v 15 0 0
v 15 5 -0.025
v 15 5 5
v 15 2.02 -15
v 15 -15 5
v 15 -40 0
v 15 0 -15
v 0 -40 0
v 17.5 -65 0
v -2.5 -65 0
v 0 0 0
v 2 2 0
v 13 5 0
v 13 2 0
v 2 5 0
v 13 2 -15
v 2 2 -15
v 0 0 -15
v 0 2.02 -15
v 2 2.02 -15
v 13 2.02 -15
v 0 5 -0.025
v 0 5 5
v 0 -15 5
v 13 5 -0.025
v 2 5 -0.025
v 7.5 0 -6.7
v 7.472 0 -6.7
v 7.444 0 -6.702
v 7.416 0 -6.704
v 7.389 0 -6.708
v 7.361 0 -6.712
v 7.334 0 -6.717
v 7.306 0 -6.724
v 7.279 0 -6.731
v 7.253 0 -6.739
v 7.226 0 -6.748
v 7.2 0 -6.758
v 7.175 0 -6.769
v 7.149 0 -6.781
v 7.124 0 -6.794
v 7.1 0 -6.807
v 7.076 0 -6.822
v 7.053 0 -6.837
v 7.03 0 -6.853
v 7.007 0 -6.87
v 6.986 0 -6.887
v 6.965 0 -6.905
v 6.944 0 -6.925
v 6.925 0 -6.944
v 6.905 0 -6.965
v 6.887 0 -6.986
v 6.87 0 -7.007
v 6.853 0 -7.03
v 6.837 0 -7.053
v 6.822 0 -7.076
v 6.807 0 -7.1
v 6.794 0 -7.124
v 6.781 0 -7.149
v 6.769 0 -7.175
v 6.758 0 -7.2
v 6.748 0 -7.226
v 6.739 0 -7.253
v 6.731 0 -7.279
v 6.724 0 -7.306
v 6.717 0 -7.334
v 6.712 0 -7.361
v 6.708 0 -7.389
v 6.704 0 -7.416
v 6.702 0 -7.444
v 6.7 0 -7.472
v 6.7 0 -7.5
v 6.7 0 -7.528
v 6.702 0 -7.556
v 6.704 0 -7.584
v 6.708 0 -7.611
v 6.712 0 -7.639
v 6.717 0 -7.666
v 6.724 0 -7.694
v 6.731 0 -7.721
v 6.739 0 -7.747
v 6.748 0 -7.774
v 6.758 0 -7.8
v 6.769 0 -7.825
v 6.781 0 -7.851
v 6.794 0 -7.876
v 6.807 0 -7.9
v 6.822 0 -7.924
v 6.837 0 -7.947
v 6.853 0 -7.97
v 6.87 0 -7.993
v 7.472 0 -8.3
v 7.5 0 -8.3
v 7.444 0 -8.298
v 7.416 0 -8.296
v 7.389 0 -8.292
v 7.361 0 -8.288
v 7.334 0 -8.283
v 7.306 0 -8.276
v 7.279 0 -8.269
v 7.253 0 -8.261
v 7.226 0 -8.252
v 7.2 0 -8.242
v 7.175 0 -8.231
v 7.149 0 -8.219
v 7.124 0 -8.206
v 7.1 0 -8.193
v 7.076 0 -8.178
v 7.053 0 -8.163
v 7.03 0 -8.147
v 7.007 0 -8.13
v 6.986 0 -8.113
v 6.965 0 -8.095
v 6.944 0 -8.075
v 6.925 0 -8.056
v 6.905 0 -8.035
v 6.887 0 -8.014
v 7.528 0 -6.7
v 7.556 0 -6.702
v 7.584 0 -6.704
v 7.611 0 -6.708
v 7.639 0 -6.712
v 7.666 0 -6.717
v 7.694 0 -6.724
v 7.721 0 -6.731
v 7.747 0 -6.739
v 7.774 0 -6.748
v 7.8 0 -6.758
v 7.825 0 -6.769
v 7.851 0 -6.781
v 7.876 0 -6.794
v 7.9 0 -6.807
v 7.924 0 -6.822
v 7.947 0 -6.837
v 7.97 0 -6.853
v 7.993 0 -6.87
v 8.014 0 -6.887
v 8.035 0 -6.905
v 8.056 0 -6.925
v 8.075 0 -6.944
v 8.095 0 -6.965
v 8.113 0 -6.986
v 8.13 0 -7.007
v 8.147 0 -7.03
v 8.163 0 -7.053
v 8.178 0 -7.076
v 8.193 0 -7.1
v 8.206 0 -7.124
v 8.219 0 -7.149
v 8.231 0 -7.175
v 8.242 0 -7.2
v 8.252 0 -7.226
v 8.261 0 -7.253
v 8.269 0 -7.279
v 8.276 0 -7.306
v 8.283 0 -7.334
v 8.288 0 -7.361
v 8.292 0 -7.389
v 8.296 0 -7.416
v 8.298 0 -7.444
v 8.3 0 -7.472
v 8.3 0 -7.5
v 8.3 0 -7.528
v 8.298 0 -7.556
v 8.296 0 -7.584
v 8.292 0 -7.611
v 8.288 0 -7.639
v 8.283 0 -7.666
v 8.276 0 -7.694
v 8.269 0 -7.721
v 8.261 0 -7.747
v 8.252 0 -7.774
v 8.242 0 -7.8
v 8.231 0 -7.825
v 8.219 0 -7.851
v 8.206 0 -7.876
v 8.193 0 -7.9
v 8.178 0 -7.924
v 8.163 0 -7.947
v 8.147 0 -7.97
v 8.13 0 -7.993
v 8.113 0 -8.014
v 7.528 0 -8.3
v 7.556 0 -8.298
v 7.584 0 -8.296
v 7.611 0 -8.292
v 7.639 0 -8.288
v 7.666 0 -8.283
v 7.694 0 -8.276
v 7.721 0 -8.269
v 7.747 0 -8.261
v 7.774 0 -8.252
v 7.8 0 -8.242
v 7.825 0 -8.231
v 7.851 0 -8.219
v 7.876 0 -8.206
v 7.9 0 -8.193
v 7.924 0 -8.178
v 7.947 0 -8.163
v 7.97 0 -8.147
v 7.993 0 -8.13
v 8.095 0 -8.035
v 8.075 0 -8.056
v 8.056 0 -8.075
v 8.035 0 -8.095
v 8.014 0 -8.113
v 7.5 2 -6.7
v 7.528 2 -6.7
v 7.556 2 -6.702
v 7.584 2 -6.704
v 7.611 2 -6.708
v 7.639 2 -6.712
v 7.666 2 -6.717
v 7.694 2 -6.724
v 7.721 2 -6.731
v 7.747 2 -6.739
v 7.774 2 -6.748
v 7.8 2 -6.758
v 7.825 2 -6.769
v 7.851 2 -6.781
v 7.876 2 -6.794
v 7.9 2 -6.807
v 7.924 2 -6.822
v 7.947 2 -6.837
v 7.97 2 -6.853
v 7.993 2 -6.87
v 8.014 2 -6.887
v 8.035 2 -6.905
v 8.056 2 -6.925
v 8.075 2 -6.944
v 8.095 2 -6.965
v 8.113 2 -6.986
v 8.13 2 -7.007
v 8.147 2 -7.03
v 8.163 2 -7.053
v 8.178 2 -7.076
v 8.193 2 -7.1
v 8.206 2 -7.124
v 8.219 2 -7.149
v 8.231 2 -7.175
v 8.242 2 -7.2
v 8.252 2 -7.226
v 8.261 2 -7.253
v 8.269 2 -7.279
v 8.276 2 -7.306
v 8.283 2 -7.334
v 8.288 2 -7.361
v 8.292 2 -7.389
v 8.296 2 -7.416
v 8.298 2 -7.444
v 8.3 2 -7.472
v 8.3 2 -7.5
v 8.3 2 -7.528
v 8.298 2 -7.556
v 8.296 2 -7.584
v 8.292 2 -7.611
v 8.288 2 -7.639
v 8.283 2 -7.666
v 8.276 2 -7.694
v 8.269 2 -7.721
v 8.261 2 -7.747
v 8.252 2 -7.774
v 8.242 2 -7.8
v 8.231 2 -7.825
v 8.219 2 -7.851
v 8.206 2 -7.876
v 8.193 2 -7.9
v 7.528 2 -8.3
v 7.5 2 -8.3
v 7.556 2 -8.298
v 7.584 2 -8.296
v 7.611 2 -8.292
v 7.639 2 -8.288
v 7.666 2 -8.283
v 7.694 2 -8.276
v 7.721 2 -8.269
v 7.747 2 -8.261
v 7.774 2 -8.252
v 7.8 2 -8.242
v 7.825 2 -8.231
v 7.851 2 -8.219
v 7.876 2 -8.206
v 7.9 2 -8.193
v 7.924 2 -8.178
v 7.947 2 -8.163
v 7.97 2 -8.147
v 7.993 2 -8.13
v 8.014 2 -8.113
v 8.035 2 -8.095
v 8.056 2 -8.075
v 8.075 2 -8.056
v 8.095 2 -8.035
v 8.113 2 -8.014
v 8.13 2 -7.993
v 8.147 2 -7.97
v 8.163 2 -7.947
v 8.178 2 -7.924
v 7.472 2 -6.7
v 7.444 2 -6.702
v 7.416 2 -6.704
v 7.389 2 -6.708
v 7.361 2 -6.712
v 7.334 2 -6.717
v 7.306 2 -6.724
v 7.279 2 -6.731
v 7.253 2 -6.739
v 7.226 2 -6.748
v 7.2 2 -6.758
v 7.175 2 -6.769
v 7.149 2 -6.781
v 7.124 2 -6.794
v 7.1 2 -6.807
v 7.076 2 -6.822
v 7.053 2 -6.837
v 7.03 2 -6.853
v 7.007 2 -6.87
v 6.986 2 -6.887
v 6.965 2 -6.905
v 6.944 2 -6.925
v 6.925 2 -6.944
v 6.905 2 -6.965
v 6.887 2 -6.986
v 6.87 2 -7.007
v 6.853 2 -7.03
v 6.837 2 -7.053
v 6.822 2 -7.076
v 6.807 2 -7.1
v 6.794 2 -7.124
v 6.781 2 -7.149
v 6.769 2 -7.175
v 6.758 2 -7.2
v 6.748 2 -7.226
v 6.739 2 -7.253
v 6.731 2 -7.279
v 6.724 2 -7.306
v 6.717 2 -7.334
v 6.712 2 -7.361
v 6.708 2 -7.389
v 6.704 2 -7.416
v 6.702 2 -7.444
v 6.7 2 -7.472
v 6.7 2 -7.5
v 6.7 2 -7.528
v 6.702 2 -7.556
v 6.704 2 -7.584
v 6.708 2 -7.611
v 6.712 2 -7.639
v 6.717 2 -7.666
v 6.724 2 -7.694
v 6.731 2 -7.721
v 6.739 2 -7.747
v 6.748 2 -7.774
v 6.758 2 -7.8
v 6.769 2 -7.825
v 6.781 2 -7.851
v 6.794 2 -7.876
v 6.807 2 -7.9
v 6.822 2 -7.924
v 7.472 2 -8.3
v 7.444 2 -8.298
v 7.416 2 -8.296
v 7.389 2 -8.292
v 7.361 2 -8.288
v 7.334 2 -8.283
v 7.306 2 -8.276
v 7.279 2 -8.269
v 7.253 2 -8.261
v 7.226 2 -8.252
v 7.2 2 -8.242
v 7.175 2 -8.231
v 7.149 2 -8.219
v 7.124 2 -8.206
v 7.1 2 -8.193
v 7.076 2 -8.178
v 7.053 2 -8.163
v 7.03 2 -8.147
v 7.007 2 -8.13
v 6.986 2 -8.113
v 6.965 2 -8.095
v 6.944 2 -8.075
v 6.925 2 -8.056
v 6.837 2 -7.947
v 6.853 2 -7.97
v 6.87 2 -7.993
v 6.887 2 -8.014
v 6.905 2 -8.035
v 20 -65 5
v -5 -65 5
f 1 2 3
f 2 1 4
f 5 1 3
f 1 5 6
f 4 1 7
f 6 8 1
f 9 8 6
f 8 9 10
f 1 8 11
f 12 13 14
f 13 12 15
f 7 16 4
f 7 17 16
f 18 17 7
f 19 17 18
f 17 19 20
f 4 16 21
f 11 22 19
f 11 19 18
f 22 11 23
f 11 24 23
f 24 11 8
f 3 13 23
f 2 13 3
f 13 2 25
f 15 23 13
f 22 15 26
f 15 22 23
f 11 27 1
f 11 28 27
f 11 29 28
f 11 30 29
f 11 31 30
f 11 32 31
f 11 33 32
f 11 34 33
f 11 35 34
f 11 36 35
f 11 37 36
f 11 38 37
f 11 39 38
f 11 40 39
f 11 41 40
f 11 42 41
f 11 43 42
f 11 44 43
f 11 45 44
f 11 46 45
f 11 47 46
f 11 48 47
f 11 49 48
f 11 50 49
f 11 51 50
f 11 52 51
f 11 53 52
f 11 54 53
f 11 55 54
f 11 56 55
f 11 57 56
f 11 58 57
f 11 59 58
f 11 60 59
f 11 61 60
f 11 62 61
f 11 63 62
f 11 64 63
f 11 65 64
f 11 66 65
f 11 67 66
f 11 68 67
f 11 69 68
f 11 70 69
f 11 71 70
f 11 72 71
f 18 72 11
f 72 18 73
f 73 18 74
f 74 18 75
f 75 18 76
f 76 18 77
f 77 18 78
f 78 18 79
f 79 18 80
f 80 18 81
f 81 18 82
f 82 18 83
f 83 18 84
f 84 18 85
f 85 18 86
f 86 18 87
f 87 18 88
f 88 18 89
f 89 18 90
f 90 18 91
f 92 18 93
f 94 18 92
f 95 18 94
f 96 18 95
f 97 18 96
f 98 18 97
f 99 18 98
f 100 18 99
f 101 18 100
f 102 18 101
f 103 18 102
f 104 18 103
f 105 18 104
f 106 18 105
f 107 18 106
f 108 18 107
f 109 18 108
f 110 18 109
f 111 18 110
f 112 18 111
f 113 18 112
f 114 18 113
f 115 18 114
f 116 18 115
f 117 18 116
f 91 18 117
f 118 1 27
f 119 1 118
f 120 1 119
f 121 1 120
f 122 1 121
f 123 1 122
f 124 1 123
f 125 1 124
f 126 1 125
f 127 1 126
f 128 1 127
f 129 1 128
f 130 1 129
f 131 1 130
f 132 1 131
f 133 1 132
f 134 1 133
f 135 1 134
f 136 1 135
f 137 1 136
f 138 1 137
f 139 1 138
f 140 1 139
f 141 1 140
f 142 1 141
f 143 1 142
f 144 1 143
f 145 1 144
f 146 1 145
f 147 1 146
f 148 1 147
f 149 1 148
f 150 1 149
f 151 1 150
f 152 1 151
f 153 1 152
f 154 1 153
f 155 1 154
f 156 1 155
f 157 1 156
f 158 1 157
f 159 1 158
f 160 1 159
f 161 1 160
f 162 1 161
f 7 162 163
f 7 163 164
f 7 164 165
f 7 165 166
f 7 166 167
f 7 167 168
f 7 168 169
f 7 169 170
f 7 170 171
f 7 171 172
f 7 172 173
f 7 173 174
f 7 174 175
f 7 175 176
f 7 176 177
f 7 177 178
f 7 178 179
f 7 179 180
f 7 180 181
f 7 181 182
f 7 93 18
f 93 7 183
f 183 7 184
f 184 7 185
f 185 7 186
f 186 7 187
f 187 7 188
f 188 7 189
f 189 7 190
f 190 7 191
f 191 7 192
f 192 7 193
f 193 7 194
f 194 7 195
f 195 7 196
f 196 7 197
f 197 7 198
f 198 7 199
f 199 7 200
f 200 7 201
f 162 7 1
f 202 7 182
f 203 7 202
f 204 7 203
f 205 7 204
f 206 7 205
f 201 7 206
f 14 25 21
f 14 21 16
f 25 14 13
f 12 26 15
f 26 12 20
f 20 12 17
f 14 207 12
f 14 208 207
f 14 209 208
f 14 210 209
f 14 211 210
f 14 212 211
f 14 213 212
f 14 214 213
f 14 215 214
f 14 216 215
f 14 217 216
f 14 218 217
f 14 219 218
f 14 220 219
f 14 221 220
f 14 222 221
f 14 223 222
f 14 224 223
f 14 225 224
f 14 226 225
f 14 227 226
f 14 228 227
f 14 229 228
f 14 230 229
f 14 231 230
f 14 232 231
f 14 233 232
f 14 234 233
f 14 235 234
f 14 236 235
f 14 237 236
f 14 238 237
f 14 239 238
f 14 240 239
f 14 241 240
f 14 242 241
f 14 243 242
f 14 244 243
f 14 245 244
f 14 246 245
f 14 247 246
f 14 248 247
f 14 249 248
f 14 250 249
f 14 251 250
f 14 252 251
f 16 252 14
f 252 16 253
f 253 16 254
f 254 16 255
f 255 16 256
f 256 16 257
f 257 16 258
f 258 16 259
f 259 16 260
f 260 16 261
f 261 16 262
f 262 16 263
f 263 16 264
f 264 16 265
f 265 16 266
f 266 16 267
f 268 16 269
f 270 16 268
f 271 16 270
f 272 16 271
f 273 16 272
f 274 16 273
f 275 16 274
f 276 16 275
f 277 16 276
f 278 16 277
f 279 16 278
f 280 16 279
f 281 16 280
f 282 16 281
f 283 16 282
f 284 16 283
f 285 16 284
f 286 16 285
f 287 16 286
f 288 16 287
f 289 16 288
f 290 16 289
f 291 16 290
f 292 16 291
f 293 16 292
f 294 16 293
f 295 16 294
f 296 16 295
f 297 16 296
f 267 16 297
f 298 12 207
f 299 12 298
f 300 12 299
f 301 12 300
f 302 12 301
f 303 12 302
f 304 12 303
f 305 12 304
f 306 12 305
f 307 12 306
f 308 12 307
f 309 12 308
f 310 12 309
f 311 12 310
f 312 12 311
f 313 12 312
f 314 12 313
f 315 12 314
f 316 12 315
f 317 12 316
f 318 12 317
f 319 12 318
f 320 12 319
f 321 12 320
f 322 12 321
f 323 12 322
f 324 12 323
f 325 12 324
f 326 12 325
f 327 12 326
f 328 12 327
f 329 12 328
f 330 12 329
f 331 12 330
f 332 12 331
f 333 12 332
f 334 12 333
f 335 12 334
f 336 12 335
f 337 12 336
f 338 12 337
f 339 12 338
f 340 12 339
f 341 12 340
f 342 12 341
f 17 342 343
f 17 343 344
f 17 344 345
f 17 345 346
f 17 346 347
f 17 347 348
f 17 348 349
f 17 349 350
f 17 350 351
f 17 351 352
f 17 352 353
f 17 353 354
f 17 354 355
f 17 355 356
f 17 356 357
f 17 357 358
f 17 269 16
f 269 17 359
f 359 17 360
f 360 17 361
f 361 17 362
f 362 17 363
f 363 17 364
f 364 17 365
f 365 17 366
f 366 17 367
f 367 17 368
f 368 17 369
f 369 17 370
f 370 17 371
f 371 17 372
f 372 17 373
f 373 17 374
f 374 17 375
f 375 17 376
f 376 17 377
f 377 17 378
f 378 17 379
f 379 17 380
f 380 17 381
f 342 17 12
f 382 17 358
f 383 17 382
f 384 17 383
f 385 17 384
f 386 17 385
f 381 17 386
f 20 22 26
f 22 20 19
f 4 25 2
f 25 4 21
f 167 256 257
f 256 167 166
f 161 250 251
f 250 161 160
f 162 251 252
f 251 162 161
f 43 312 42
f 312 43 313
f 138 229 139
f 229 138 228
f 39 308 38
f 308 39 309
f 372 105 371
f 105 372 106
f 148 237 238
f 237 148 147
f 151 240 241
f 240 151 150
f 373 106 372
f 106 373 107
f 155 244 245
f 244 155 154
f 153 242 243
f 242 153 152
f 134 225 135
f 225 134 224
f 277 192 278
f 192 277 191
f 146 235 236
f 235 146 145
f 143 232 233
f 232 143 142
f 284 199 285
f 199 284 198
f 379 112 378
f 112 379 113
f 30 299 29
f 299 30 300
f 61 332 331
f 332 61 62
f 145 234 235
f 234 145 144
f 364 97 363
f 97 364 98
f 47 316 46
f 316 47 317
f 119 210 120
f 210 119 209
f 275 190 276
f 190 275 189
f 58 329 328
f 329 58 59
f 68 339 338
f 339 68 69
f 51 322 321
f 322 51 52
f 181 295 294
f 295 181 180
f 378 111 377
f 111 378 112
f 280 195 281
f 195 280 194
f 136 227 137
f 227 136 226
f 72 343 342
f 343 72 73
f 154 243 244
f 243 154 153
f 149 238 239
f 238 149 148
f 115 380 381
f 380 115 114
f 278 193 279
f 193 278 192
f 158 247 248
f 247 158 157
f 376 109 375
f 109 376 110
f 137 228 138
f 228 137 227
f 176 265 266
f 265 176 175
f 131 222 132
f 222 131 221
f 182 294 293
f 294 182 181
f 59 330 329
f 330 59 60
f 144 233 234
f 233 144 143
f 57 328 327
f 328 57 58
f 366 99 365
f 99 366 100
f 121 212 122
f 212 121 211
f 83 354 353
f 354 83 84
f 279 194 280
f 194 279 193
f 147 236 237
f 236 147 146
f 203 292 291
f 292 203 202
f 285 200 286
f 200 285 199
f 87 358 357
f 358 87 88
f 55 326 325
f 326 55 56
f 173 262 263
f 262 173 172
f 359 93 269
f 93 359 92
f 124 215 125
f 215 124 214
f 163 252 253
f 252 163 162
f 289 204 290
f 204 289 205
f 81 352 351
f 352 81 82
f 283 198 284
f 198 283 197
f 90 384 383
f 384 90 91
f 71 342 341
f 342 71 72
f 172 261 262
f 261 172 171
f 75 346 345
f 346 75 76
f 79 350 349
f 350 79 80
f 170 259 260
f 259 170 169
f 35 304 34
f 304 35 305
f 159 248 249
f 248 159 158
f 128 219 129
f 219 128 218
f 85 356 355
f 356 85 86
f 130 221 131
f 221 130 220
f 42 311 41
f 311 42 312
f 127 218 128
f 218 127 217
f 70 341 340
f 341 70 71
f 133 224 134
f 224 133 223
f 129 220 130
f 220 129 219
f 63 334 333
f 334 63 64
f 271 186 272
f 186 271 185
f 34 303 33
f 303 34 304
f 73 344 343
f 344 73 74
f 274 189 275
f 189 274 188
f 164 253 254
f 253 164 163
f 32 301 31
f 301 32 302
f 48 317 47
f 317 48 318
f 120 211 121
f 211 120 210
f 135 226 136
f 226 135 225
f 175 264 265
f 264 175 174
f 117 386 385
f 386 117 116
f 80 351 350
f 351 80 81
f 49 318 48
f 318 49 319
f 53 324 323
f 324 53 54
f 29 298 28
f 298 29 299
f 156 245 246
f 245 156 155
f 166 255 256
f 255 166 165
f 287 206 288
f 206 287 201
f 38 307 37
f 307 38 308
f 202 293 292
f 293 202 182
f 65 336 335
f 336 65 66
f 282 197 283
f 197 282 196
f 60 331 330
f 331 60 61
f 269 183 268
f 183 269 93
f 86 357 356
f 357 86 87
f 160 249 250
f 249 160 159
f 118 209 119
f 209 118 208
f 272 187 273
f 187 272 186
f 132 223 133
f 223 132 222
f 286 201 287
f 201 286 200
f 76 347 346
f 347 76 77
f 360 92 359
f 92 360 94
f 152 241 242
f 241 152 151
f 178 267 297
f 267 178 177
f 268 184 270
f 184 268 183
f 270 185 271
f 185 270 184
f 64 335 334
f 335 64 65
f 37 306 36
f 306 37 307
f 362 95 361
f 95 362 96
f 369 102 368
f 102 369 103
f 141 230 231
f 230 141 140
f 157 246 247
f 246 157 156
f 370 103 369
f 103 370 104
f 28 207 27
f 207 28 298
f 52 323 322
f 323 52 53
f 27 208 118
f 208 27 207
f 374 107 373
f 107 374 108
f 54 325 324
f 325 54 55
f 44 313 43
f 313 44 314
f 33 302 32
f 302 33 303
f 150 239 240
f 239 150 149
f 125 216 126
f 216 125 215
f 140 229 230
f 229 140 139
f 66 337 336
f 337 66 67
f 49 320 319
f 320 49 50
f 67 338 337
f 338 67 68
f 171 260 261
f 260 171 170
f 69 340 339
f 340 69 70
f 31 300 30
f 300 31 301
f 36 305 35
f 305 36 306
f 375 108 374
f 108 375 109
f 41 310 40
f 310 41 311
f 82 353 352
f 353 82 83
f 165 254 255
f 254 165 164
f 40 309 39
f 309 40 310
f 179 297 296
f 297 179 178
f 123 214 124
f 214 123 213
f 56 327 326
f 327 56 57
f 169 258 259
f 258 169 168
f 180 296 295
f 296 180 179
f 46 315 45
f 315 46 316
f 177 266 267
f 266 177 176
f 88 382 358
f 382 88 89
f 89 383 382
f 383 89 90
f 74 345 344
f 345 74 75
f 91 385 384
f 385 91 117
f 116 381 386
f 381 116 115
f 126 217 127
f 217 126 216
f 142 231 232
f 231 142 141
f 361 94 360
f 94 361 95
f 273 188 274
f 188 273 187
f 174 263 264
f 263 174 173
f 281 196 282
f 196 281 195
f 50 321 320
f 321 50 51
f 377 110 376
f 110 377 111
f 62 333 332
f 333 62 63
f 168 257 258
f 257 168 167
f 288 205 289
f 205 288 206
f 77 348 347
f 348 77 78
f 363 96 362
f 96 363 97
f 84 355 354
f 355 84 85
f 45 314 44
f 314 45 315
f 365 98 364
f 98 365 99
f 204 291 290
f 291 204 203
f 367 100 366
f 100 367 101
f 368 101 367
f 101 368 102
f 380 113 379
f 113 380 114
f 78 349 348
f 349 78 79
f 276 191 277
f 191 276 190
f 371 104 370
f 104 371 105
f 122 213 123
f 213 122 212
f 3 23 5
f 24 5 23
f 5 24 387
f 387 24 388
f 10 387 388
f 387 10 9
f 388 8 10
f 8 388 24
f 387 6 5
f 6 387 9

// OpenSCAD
// file: parts/slide.scad
module slide(l, h, w1, w2){
    translate([-w1/2, -l/2, -h/2])
    polyhedron(
        points=[
            // lowest layer
            [0, 0, 0],
            [w1, 0, 0],
            [w2-((w2-w1)/2), l, 0],
            [-((w2-w1)/2), l, 0],

            // top layer
            [h/2, 0, h],
            [w1-h/2, 0, h],
            [w2-((w2-w1)/2)-h/2, l, h],
            [-((w2-w1)/2)+h/2, l, h],
            [0, h/2, h],
            [0, w1-h/2, h],
            [l, w2-((w2-w1)/2), h],
            [l, -((w2-w1)/2)+h/2, h]
        ],
        faces=[
            // bottom
            [0, 1, 2, 3],

            // sides beginning with front
            [0, 4, 5, 1],
            [1, 5, 6, 2],
            [3, 2, 6, 7],
            [0, 3, 7, 4],

            // top
            [4, 7, 6, 5]
        ]
    );
}

slide(60, 5, 20, 24);
// file: parts/screw_hole.scad
module screw_hole(r1, h1, r2, h2, r3, h3){
    d = 0.01;

    union() {
        cylinder(h=h1, r=r1, $fn=60);
        translate([0, 0, h1-d]) cylinder(h=h2+d, r1=r1, r2=r2, $fn=60);
        translate([0, 0, h1+h2-d]) cylinder(h=h3+d, r=r3, $fn=60);
    }
}

screw_hole(r1=10, h1=10, r2=20, h2=10, r3=30, h3=10);
// main file
use <parts/screw_hole.scad>;
use <parts/slide.scad>;

width = 15;
depth = 80;
distance = 65;
height = 5;

difference() {
  translate([0, 0, -15])
    cube([width, 5, 15]);

  translate([2, 2, -20])
    cube([width-4, 6, 20]);

  translate([-1, 6, 5])
  rotate([90, 180, 90])
    linear_extrude(height=width+2)
    polygon(points=[[0, 0], [4, 20.1], [0, 20.1]]);

  translate([width/2, 1, -15/2])
  rotate([90, 0, 0])
    cylinder(h=5, r=0.8, $fn=180, center=true);
}

translate([0, -depth+20+height, 0])
  cube([width, depth-20, height]);

translate([0, -depth, 0])
translate([width/2, depth/2, 2.5])
rotate([0, 180, 0])
  slide(l = 50, h = 5, w1 = width+10, w2 = width);
